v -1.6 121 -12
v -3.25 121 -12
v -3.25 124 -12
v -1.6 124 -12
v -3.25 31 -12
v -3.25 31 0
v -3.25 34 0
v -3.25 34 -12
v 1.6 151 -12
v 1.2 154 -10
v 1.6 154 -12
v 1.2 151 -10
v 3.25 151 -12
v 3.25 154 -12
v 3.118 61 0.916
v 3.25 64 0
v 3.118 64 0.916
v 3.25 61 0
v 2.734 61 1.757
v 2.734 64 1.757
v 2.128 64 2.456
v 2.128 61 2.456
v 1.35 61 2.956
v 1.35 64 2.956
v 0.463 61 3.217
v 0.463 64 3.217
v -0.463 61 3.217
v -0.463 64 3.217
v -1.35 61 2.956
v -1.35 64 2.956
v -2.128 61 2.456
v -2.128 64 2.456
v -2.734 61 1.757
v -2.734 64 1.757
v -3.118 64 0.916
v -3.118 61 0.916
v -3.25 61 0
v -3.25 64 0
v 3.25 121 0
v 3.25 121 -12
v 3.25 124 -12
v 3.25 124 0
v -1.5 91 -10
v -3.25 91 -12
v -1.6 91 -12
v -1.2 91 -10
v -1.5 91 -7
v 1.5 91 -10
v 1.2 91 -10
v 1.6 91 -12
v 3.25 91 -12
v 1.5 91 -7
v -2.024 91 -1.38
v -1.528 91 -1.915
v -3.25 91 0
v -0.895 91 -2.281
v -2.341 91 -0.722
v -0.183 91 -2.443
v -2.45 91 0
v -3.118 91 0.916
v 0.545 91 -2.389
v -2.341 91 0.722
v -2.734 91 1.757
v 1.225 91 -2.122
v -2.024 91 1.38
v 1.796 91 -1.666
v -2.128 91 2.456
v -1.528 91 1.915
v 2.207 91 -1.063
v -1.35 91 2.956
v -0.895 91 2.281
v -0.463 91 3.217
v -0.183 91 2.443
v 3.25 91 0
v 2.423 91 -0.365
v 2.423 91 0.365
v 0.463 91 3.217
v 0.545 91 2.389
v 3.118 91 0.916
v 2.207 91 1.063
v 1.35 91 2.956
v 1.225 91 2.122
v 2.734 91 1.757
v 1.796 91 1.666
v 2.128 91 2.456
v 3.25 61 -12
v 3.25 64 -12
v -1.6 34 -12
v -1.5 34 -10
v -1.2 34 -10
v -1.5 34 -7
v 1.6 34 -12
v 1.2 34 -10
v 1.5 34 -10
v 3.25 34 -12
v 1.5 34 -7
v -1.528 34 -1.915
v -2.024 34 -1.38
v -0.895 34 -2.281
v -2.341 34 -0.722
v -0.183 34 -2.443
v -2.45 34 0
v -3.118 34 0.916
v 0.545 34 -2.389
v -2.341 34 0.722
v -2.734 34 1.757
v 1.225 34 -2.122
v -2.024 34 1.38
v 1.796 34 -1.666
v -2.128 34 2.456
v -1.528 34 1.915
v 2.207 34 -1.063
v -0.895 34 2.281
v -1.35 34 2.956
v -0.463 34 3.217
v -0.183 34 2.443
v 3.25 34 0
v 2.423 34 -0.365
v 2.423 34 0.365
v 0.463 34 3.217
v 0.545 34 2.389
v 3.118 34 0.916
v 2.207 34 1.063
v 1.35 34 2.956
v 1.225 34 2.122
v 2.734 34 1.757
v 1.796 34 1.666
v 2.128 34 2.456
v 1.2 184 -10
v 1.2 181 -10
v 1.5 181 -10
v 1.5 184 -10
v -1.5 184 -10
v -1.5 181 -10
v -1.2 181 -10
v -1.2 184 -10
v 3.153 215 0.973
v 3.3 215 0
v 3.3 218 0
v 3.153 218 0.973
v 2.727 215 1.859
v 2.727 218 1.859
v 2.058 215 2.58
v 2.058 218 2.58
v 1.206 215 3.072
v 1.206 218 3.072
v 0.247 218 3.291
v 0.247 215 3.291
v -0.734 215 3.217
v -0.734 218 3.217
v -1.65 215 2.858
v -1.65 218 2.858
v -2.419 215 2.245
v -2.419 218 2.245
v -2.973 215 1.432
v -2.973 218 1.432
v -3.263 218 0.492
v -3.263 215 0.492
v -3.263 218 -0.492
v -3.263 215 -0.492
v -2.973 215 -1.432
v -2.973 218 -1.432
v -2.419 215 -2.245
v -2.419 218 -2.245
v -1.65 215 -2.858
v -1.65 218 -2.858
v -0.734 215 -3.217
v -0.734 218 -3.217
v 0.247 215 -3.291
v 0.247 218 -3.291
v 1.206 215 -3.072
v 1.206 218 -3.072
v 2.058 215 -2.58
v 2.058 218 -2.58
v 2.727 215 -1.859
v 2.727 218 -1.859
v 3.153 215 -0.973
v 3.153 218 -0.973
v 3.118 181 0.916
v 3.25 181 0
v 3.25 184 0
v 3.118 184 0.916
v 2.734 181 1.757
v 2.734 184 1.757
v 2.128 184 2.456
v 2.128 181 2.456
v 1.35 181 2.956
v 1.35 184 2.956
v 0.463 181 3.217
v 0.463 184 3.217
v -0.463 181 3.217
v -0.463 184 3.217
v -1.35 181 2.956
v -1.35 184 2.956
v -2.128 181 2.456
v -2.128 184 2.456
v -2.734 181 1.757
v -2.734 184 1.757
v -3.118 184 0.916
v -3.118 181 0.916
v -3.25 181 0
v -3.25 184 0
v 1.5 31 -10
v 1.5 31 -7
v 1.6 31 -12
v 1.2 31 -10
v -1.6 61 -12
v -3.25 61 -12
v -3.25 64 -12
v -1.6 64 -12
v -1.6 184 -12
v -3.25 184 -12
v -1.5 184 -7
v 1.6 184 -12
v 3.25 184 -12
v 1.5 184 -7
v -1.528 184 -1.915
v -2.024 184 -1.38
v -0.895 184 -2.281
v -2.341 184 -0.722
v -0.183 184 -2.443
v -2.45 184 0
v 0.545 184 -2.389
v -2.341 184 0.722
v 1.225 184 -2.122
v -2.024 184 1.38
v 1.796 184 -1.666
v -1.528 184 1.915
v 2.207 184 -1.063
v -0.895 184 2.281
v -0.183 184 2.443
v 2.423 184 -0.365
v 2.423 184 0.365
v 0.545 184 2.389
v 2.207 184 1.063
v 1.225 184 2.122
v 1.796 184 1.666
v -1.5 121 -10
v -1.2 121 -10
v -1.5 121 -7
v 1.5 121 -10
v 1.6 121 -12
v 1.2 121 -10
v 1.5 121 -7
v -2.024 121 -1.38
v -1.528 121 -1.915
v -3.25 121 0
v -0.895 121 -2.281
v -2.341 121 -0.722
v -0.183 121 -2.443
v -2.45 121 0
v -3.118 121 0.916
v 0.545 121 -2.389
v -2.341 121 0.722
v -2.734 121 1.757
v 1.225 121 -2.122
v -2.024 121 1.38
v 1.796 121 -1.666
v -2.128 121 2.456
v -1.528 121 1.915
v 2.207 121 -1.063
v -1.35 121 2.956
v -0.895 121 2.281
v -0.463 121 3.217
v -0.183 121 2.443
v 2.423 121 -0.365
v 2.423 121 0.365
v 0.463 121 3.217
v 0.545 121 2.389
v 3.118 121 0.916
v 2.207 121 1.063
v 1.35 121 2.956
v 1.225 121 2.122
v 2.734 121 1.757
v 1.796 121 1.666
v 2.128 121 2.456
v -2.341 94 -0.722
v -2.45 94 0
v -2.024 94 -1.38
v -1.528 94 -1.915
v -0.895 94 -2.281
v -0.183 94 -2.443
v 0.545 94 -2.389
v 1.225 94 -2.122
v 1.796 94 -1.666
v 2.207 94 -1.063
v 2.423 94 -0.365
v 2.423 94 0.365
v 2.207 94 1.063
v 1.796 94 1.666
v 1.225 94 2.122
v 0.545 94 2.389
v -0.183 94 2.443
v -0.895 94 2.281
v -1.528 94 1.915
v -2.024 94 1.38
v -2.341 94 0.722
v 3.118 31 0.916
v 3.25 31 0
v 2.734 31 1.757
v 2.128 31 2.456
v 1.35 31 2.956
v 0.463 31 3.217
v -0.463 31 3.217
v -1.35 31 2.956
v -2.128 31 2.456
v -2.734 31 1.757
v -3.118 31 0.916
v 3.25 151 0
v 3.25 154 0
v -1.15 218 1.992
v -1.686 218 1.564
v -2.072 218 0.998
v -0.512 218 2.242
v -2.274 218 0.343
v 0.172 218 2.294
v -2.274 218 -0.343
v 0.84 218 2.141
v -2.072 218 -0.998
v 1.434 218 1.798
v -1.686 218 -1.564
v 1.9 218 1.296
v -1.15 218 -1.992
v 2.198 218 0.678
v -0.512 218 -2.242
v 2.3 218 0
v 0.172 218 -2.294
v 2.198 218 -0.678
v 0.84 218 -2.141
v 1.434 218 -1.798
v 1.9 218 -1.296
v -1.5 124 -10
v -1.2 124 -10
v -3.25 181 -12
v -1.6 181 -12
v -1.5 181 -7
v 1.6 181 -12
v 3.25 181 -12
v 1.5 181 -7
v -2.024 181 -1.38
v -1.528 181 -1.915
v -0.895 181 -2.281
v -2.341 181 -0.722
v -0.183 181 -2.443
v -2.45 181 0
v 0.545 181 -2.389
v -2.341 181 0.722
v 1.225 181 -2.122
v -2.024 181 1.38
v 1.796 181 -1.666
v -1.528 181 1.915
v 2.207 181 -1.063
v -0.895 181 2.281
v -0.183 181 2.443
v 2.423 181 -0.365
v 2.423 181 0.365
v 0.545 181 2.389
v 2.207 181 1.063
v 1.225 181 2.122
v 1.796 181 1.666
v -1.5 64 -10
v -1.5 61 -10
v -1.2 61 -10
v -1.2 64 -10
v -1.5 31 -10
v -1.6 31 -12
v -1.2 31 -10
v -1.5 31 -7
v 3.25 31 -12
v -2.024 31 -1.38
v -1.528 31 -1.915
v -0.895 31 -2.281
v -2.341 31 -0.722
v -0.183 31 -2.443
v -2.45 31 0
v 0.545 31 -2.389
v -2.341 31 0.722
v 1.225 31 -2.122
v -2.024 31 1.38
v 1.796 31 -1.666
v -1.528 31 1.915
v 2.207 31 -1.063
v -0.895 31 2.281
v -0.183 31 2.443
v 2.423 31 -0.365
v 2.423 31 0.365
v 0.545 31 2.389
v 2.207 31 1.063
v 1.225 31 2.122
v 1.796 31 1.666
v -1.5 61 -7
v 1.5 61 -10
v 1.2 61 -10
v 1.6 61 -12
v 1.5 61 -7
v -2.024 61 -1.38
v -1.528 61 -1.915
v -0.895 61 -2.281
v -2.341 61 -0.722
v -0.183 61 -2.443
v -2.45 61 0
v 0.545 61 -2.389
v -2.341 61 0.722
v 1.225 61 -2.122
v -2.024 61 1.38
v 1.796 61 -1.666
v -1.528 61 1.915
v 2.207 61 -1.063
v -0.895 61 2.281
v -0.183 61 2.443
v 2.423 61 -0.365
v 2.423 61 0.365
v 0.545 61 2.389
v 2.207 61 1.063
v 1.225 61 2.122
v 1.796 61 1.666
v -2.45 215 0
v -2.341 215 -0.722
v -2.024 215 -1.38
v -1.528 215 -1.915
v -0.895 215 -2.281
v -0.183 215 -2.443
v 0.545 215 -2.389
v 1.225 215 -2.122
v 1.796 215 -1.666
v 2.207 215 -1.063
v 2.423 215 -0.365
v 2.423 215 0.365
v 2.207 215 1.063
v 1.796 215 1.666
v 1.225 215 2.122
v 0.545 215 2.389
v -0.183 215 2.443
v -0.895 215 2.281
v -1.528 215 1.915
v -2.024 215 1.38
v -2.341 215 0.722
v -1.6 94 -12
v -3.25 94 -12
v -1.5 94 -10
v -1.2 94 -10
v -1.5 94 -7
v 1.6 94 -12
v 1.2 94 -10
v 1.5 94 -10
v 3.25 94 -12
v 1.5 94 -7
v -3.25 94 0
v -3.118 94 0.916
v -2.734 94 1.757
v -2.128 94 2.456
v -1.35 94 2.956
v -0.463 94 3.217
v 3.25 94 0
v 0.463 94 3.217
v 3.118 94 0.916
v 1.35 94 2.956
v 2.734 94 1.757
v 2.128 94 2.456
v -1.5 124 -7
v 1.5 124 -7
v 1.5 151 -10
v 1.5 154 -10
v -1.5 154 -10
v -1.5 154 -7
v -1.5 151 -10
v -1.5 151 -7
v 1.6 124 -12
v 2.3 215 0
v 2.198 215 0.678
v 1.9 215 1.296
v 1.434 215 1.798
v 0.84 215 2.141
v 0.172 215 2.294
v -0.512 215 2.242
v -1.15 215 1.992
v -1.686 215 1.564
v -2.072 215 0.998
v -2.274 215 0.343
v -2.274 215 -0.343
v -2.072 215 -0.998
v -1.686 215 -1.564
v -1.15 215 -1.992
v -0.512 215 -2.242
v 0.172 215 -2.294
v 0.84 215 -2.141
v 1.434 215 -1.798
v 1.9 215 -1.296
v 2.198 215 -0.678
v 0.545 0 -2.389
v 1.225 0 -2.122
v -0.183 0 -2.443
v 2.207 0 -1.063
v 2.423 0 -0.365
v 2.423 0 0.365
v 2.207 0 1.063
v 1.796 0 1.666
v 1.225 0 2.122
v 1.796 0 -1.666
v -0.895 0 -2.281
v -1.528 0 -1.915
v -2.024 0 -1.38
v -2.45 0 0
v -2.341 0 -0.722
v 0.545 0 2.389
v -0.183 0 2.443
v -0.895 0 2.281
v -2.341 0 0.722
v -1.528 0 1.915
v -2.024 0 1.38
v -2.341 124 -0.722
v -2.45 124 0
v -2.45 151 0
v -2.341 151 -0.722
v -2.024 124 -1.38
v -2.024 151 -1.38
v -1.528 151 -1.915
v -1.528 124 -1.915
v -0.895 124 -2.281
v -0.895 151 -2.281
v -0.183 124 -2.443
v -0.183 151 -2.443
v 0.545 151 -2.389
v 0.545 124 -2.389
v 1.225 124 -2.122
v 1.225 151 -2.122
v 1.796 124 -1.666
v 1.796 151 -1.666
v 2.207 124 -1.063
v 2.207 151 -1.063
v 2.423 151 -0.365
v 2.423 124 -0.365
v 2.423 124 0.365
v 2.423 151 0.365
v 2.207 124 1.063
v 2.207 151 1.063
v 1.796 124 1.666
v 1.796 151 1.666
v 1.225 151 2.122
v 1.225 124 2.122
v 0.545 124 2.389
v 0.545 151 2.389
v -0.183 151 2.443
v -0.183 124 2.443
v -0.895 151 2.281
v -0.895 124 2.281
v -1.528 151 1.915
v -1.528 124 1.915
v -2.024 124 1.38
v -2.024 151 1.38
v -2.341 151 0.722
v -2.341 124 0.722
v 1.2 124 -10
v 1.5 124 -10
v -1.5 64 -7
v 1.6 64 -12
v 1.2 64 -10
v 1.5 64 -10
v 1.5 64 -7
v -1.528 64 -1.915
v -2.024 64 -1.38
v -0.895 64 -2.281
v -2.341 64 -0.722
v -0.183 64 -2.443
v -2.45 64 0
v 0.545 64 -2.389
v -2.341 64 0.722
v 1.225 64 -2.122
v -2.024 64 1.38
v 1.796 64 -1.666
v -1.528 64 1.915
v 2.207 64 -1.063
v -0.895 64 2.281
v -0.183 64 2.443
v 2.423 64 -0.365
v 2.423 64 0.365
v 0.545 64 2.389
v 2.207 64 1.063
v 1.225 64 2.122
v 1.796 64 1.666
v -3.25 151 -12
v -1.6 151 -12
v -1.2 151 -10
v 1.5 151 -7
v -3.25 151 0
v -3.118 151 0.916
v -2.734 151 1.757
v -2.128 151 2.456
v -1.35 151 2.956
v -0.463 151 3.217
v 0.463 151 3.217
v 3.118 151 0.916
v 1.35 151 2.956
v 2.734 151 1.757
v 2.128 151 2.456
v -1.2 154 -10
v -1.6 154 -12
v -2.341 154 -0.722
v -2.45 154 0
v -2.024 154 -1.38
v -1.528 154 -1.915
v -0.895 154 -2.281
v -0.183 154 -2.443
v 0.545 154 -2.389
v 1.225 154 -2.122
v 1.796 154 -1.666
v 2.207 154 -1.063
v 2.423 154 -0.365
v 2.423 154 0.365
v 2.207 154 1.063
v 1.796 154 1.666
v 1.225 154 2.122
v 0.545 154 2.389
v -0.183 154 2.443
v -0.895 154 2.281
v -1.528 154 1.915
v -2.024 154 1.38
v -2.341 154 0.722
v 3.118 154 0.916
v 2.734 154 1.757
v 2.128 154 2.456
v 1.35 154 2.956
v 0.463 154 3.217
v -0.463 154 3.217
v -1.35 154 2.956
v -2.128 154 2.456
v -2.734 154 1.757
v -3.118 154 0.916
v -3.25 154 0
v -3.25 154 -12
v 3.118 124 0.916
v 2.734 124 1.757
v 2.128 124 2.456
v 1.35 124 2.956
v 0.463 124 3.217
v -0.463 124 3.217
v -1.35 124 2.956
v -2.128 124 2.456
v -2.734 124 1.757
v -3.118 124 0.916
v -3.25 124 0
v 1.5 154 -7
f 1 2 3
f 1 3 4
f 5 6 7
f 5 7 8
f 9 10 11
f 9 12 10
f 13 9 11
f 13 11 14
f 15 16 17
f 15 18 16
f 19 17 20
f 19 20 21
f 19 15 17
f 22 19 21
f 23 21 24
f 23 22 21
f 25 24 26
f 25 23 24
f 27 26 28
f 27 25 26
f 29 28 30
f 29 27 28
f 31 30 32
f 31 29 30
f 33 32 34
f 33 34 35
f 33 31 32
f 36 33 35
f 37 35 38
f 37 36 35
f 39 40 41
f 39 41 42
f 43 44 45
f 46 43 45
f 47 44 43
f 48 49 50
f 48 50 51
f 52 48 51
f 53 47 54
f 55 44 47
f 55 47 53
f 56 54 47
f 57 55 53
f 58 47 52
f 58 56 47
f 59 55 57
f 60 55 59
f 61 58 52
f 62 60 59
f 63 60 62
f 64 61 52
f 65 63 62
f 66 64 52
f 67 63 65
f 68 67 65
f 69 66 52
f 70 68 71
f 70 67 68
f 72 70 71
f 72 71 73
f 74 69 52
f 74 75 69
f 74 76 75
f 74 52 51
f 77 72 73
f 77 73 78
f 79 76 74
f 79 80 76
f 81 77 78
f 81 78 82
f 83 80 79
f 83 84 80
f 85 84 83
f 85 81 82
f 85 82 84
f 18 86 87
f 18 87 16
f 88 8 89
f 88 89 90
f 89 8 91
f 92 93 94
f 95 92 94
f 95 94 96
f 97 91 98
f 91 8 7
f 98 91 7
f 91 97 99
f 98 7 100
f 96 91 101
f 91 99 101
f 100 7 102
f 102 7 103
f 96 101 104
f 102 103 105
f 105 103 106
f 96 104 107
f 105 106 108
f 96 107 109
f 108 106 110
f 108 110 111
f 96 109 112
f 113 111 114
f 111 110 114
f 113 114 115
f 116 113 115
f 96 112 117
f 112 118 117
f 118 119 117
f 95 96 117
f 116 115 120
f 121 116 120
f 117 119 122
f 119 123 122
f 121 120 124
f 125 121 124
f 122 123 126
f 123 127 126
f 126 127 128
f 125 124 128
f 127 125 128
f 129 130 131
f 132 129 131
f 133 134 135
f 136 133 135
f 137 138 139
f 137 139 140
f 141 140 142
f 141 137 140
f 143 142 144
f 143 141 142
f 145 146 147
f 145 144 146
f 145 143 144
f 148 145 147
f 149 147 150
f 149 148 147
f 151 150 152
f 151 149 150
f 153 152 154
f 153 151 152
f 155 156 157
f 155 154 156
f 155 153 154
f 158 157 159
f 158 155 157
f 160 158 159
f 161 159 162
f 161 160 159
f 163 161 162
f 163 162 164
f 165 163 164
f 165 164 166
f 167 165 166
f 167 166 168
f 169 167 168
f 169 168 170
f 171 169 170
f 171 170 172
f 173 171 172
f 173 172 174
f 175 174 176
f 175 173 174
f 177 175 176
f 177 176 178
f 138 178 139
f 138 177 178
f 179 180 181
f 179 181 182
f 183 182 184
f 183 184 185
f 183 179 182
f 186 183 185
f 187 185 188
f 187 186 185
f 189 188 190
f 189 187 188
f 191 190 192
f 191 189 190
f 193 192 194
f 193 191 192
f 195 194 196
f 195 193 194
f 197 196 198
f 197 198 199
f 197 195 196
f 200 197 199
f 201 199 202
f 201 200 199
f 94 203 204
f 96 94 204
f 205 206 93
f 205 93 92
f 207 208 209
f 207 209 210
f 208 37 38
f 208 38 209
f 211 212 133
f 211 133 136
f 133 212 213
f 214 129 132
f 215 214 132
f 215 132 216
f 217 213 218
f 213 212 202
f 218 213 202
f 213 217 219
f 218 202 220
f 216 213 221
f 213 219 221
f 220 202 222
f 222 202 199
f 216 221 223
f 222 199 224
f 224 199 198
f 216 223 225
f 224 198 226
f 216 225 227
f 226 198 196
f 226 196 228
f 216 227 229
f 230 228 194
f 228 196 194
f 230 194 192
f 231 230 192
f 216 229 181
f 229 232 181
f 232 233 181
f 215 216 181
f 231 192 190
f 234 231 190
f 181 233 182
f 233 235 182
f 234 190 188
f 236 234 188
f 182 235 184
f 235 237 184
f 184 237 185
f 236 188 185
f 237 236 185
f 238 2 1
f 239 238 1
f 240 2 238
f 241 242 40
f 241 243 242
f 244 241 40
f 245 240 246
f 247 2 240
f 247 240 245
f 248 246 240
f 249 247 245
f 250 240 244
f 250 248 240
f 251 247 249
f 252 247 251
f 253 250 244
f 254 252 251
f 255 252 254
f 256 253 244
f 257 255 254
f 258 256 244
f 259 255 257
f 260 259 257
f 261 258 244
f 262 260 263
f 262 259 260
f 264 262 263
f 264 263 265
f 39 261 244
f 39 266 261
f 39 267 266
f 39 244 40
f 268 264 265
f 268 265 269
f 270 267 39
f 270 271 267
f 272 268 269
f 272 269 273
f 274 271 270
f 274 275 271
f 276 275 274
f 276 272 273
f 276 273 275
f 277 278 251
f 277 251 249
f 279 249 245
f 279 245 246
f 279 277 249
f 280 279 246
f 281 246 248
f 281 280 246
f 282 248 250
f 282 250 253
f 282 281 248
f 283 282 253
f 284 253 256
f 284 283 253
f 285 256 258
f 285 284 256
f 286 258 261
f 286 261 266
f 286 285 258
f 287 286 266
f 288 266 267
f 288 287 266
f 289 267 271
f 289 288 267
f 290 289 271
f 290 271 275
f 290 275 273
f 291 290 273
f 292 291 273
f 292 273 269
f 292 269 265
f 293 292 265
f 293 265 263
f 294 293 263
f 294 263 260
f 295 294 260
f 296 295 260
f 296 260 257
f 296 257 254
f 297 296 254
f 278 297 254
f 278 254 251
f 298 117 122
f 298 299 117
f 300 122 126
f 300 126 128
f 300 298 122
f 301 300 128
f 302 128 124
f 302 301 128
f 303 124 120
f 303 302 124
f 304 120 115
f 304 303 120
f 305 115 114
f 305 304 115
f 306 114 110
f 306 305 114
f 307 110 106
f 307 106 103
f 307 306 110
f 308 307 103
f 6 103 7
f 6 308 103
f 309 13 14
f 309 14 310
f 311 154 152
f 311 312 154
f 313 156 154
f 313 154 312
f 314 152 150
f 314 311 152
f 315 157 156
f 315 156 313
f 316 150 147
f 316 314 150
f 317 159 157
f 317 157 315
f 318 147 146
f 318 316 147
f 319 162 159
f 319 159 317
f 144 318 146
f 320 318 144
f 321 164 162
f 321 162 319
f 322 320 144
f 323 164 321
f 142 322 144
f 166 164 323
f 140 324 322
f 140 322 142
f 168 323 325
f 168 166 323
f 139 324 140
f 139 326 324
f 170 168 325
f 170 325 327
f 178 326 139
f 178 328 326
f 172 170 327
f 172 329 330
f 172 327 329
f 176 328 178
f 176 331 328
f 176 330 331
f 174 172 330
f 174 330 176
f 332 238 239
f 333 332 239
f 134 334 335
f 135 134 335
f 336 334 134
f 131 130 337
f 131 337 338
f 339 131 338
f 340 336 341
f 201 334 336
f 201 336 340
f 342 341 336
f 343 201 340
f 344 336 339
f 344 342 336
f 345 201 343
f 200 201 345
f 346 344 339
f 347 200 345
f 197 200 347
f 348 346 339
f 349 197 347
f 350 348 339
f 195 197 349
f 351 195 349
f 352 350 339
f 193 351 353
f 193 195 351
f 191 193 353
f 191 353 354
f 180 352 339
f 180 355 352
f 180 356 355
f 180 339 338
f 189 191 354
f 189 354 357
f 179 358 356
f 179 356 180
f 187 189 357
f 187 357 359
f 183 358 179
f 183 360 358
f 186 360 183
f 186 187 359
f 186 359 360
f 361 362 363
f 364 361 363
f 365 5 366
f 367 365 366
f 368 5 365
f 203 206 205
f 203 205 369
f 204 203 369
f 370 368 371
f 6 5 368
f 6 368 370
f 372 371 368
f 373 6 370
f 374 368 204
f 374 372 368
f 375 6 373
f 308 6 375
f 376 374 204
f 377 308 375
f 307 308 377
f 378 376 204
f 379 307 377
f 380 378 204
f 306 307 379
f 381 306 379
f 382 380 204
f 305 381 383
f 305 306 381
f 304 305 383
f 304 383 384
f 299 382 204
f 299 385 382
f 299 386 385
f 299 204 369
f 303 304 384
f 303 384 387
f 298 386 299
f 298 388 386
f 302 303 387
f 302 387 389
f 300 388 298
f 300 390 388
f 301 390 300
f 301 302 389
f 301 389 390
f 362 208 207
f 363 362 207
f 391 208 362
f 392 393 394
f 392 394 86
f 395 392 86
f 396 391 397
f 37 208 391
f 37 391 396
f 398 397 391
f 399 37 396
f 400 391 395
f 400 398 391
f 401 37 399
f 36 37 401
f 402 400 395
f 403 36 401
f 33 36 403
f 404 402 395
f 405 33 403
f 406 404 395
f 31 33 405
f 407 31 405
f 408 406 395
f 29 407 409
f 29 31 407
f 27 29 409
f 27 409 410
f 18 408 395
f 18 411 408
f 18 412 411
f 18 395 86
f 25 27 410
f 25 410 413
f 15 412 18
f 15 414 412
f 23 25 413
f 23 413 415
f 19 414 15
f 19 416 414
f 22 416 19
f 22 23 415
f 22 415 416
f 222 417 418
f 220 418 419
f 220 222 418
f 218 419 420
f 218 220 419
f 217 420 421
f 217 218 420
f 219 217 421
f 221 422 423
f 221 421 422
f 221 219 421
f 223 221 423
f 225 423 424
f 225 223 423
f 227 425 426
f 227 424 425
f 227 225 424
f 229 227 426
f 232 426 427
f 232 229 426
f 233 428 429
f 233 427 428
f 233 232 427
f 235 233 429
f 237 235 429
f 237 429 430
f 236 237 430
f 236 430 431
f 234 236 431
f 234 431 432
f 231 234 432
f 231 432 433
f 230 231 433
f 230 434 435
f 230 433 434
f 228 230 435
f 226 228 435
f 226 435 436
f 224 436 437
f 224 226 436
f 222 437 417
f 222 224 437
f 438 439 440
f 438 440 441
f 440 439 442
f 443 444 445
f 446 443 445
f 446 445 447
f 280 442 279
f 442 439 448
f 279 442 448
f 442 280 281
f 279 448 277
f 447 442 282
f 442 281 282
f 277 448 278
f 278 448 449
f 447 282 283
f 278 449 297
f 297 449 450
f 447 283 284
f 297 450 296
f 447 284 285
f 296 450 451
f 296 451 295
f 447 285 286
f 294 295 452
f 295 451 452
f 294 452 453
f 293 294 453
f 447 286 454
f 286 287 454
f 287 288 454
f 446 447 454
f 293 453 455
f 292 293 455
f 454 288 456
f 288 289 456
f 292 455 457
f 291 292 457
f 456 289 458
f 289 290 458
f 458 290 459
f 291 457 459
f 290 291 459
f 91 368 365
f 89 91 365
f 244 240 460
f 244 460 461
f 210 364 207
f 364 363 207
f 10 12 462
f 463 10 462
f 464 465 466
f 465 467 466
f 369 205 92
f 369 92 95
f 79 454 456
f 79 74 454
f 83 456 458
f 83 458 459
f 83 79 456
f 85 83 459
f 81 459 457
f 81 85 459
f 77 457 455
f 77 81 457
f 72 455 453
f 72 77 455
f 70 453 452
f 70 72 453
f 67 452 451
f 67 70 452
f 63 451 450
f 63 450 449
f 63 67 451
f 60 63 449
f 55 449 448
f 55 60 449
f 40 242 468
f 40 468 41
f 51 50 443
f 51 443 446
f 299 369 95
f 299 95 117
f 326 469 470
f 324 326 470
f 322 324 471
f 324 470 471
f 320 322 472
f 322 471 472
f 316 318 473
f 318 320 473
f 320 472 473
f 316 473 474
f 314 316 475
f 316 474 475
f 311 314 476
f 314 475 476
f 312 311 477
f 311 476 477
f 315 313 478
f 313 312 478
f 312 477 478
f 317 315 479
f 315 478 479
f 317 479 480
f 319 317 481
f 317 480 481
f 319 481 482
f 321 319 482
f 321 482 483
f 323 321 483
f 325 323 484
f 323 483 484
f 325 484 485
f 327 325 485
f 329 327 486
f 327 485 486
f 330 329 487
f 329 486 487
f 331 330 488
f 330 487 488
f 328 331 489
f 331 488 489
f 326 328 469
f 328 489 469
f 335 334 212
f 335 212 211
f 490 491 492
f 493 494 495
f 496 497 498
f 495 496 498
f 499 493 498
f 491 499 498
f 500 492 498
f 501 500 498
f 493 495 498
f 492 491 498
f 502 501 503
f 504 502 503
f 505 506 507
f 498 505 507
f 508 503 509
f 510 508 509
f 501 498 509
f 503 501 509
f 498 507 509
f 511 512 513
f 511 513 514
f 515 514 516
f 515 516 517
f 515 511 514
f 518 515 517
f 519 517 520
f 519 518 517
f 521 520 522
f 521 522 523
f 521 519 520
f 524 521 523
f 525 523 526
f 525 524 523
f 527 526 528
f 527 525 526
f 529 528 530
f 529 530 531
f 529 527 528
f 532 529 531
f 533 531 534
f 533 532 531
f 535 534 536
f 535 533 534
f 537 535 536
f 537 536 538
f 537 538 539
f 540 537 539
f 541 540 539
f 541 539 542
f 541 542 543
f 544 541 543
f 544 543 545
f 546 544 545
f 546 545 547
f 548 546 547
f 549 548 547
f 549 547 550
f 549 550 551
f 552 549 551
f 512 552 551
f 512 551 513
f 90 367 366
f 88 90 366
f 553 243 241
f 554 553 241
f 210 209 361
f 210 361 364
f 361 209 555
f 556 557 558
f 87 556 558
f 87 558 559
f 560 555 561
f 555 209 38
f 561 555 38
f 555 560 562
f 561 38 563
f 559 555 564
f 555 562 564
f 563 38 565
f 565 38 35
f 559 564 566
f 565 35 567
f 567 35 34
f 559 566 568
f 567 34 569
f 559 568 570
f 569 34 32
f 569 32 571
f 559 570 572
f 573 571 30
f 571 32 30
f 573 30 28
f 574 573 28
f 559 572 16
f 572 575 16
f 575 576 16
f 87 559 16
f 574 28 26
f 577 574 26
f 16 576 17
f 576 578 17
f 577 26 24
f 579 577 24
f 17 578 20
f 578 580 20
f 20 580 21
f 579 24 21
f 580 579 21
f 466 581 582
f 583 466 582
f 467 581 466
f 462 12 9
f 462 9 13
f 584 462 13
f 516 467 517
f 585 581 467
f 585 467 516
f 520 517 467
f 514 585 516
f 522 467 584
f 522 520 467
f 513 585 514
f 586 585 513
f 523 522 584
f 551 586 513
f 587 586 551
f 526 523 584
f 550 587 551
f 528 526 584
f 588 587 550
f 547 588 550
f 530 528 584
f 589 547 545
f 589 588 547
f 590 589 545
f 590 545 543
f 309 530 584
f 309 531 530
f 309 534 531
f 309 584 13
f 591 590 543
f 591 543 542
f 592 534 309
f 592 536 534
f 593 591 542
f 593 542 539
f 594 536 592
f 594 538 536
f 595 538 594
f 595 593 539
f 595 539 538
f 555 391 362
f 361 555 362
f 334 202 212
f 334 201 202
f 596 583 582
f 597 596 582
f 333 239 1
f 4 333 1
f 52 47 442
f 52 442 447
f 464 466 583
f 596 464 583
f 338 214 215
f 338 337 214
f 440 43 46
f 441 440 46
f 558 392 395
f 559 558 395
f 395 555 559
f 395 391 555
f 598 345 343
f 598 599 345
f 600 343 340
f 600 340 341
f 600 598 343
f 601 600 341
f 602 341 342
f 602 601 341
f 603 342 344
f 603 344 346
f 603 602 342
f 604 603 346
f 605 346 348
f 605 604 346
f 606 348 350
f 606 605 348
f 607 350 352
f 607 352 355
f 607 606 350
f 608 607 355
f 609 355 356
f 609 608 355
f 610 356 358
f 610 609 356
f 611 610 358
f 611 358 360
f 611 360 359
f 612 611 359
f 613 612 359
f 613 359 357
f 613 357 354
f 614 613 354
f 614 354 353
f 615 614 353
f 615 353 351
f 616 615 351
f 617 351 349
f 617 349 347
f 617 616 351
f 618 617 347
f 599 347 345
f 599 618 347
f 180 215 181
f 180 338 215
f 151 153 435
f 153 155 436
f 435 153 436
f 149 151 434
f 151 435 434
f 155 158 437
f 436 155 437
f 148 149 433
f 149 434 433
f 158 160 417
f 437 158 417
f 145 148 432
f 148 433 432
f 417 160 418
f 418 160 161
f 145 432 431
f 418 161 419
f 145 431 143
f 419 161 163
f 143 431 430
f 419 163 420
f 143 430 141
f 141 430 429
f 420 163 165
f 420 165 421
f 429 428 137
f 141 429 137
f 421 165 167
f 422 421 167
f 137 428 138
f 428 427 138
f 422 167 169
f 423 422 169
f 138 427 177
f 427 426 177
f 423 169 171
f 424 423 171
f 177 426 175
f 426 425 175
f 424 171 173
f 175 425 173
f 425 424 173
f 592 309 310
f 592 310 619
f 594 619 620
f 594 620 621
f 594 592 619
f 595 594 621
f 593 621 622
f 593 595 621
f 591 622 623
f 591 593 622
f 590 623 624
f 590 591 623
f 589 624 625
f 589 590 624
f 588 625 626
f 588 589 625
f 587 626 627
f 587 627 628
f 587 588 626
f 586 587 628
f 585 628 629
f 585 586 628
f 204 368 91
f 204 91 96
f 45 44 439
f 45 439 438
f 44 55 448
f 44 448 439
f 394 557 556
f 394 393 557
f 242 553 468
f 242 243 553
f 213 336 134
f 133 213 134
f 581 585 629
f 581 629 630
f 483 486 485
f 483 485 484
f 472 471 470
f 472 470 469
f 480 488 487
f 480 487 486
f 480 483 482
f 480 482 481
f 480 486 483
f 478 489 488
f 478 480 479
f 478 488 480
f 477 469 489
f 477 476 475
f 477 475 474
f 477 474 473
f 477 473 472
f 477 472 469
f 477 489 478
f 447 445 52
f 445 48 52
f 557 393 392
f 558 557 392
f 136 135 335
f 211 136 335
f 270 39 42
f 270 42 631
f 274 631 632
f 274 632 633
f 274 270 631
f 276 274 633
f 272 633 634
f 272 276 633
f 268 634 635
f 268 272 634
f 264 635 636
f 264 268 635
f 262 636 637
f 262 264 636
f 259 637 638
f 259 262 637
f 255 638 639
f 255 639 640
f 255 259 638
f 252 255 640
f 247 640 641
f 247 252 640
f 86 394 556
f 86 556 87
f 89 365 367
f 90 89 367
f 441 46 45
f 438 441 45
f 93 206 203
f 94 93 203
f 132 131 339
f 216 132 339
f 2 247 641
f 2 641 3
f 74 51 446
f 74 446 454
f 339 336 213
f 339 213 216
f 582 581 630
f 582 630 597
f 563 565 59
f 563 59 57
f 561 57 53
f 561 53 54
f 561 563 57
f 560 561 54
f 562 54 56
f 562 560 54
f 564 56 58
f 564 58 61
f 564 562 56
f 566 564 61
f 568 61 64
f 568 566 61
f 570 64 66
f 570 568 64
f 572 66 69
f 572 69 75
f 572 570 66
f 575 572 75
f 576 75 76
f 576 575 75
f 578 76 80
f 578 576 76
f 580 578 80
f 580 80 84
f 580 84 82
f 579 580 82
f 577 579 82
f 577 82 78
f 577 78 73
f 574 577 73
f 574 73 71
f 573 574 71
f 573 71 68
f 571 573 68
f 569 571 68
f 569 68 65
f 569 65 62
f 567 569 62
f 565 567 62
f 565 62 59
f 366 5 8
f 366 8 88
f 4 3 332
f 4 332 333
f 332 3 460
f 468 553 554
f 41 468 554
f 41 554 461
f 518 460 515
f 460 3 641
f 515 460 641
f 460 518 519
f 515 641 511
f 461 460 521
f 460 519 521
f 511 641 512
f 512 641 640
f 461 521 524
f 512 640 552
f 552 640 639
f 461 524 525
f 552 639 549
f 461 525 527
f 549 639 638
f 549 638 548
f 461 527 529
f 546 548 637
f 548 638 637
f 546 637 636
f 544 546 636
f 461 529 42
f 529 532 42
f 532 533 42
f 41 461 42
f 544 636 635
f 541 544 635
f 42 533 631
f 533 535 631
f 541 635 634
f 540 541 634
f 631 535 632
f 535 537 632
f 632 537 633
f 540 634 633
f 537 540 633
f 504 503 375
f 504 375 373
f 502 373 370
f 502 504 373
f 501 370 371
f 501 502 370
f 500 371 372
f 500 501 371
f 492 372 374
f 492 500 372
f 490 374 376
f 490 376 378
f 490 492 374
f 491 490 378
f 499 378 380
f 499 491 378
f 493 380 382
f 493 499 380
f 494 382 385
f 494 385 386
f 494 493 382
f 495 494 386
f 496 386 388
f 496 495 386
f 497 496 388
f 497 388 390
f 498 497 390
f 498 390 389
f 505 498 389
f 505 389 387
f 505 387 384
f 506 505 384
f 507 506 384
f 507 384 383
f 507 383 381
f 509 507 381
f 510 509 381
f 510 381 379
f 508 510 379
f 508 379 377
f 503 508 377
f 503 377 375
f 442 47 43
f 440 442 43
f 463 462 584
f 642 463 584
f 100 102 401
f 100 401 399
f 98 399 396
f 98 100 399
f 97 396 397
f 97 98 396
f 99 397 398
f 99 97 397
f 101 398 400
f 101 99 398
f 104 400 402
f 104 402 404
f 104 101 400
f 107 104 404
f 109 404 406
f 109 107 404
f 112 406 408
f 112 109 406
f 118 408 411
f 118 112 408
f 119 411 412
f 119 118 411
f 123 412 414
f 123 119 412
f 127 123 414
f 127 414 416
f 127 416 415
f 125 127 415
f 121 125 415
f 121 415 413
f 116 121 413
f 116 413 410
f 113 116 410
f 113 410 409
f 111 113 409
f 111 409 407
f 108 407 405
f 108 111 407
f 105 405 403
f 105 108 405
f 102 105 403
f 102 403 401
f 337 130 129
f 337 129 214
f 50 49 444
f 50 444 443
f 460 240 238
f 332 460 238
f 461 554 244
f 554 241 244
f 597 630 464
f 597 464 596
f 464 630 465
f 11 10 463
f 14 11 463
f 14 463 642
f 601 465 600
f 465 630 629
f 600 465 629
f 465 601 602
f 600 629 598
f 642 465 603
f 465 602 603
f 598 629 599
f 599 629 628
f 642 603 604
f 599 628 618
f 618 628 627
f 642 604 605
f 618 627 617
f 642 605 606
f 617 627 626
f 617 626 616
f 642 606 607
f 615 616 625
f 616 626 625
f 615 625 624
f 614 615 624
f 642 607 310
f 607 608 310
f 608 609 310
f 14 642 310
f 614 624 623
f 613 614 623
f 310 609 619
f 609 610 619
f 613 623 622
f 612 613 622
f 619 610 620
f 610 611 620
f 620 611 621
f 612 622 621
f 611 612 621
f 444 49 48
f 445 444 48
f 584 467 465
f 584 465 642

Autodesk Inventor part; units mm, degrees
ref_plane "YZ Plane" through (0, 0, 0) normal (1, 0, 0) x (0, 1, 0)
ref_plane "XZ Plane" through (0, 0, 0) normal (0, 1, 0) x (-1, 0, 0)
sketch "草圖1" plane through (0, 0, 0) normal (0, 1, 0) x (-1, 0, 0)
  circle A0 centre (0, 0) radius 2.45
  dimension "d0" = 4.9
extrude "擠出1" add sketch "草圖1" along normal blind 215
sketch "草圖2" plane through (0, 215, 0) normal (0, 1, 0) x (1, 0, 0)
  circle A0 centre (0, 0) radius 2.45 projected
  circle A1 centre (0, 0) radius 2.3
  circle A2 centre (0, 0) radius 3.3
  dimension "d3" = 4.6
  dimension "d4" = 6.6
extrude "擠出2" add sketch "草圖2" along normal blind 3 contours A0 | A2
ref_plane "工作平面1" through (0, 31, 0) normal (0, -1, 0) x (1, 0, 0)
sketch "草圖3" plane through (0, 31, 0) normal (0, -1, 0) x (1, 0, 0)
  circle A0 centre (0, 0) radius 2.45 projected
  circle A1 centre (0, 0) radius 3.25
  line L0 (3.25, 0) -> (-3.25, 0)
  line L1 (-3.25, 0) -> (-3.25, -12)
  line L2 (-3.25, -12) -> (3.25, -12)
  line L3 (3.25, -12) -> (3.25, 0)
  line L4 (1.6, -12) -> (-1.6, -12)
  line L5 (-1.6, -12) -> (-1.6, -7)
  line L6 (-1.6, -7) -> (1.6, -7)
  line L7 (1.6, -7) -> (1.6, -12)
  line L8 (1.5, -7) -> (-1.5, -7)
  line L9 (-1.5, -7) -> (-1.5, -10)
  line L10 (-1.5, -10) -> (1.5, -10)
  line L11 (1.5, -10) -> (1.5, -7)
  line L12 (1.5, -10) -> (1.2, -10)
  line L13 (1.2, -10) -> (1.6, -12)
  line L14 (-1.5, -10) -> (-1.2, -10)
  line L15 (-1.2, -10) -> (-1.6, -12)
  point P0 (0, -12)
  point P1 (0, -12)
  point P2 (0, -7)
  dimension "d17" = 6.5
  dimension "d9" = 12
  dimension "d11" = 5
  dimension "d12" = 3.2
  dimension "d13" = 3
  dimension "d14" = 3
  dimension "d15" = 0.3
  dimension "d16" = 0.3
  dimension "d18" = 6.5
extrude "擠出3" add sketch "草圖3" against normal blind 3 contours L0 A1 A0 | A0 L0 A1 | L3 L2 L7 L6 L5 L1 A1 | L13 L10 L11 L6 L7 | L5 L6 L9 L10 L15
pattern_linear "矩形陣列1" count 6 spacing 30 along (0, 1, 0) of "擠出3"
properties part number "[3DP]bar" material "MDF Medium Density Fiberboard"
